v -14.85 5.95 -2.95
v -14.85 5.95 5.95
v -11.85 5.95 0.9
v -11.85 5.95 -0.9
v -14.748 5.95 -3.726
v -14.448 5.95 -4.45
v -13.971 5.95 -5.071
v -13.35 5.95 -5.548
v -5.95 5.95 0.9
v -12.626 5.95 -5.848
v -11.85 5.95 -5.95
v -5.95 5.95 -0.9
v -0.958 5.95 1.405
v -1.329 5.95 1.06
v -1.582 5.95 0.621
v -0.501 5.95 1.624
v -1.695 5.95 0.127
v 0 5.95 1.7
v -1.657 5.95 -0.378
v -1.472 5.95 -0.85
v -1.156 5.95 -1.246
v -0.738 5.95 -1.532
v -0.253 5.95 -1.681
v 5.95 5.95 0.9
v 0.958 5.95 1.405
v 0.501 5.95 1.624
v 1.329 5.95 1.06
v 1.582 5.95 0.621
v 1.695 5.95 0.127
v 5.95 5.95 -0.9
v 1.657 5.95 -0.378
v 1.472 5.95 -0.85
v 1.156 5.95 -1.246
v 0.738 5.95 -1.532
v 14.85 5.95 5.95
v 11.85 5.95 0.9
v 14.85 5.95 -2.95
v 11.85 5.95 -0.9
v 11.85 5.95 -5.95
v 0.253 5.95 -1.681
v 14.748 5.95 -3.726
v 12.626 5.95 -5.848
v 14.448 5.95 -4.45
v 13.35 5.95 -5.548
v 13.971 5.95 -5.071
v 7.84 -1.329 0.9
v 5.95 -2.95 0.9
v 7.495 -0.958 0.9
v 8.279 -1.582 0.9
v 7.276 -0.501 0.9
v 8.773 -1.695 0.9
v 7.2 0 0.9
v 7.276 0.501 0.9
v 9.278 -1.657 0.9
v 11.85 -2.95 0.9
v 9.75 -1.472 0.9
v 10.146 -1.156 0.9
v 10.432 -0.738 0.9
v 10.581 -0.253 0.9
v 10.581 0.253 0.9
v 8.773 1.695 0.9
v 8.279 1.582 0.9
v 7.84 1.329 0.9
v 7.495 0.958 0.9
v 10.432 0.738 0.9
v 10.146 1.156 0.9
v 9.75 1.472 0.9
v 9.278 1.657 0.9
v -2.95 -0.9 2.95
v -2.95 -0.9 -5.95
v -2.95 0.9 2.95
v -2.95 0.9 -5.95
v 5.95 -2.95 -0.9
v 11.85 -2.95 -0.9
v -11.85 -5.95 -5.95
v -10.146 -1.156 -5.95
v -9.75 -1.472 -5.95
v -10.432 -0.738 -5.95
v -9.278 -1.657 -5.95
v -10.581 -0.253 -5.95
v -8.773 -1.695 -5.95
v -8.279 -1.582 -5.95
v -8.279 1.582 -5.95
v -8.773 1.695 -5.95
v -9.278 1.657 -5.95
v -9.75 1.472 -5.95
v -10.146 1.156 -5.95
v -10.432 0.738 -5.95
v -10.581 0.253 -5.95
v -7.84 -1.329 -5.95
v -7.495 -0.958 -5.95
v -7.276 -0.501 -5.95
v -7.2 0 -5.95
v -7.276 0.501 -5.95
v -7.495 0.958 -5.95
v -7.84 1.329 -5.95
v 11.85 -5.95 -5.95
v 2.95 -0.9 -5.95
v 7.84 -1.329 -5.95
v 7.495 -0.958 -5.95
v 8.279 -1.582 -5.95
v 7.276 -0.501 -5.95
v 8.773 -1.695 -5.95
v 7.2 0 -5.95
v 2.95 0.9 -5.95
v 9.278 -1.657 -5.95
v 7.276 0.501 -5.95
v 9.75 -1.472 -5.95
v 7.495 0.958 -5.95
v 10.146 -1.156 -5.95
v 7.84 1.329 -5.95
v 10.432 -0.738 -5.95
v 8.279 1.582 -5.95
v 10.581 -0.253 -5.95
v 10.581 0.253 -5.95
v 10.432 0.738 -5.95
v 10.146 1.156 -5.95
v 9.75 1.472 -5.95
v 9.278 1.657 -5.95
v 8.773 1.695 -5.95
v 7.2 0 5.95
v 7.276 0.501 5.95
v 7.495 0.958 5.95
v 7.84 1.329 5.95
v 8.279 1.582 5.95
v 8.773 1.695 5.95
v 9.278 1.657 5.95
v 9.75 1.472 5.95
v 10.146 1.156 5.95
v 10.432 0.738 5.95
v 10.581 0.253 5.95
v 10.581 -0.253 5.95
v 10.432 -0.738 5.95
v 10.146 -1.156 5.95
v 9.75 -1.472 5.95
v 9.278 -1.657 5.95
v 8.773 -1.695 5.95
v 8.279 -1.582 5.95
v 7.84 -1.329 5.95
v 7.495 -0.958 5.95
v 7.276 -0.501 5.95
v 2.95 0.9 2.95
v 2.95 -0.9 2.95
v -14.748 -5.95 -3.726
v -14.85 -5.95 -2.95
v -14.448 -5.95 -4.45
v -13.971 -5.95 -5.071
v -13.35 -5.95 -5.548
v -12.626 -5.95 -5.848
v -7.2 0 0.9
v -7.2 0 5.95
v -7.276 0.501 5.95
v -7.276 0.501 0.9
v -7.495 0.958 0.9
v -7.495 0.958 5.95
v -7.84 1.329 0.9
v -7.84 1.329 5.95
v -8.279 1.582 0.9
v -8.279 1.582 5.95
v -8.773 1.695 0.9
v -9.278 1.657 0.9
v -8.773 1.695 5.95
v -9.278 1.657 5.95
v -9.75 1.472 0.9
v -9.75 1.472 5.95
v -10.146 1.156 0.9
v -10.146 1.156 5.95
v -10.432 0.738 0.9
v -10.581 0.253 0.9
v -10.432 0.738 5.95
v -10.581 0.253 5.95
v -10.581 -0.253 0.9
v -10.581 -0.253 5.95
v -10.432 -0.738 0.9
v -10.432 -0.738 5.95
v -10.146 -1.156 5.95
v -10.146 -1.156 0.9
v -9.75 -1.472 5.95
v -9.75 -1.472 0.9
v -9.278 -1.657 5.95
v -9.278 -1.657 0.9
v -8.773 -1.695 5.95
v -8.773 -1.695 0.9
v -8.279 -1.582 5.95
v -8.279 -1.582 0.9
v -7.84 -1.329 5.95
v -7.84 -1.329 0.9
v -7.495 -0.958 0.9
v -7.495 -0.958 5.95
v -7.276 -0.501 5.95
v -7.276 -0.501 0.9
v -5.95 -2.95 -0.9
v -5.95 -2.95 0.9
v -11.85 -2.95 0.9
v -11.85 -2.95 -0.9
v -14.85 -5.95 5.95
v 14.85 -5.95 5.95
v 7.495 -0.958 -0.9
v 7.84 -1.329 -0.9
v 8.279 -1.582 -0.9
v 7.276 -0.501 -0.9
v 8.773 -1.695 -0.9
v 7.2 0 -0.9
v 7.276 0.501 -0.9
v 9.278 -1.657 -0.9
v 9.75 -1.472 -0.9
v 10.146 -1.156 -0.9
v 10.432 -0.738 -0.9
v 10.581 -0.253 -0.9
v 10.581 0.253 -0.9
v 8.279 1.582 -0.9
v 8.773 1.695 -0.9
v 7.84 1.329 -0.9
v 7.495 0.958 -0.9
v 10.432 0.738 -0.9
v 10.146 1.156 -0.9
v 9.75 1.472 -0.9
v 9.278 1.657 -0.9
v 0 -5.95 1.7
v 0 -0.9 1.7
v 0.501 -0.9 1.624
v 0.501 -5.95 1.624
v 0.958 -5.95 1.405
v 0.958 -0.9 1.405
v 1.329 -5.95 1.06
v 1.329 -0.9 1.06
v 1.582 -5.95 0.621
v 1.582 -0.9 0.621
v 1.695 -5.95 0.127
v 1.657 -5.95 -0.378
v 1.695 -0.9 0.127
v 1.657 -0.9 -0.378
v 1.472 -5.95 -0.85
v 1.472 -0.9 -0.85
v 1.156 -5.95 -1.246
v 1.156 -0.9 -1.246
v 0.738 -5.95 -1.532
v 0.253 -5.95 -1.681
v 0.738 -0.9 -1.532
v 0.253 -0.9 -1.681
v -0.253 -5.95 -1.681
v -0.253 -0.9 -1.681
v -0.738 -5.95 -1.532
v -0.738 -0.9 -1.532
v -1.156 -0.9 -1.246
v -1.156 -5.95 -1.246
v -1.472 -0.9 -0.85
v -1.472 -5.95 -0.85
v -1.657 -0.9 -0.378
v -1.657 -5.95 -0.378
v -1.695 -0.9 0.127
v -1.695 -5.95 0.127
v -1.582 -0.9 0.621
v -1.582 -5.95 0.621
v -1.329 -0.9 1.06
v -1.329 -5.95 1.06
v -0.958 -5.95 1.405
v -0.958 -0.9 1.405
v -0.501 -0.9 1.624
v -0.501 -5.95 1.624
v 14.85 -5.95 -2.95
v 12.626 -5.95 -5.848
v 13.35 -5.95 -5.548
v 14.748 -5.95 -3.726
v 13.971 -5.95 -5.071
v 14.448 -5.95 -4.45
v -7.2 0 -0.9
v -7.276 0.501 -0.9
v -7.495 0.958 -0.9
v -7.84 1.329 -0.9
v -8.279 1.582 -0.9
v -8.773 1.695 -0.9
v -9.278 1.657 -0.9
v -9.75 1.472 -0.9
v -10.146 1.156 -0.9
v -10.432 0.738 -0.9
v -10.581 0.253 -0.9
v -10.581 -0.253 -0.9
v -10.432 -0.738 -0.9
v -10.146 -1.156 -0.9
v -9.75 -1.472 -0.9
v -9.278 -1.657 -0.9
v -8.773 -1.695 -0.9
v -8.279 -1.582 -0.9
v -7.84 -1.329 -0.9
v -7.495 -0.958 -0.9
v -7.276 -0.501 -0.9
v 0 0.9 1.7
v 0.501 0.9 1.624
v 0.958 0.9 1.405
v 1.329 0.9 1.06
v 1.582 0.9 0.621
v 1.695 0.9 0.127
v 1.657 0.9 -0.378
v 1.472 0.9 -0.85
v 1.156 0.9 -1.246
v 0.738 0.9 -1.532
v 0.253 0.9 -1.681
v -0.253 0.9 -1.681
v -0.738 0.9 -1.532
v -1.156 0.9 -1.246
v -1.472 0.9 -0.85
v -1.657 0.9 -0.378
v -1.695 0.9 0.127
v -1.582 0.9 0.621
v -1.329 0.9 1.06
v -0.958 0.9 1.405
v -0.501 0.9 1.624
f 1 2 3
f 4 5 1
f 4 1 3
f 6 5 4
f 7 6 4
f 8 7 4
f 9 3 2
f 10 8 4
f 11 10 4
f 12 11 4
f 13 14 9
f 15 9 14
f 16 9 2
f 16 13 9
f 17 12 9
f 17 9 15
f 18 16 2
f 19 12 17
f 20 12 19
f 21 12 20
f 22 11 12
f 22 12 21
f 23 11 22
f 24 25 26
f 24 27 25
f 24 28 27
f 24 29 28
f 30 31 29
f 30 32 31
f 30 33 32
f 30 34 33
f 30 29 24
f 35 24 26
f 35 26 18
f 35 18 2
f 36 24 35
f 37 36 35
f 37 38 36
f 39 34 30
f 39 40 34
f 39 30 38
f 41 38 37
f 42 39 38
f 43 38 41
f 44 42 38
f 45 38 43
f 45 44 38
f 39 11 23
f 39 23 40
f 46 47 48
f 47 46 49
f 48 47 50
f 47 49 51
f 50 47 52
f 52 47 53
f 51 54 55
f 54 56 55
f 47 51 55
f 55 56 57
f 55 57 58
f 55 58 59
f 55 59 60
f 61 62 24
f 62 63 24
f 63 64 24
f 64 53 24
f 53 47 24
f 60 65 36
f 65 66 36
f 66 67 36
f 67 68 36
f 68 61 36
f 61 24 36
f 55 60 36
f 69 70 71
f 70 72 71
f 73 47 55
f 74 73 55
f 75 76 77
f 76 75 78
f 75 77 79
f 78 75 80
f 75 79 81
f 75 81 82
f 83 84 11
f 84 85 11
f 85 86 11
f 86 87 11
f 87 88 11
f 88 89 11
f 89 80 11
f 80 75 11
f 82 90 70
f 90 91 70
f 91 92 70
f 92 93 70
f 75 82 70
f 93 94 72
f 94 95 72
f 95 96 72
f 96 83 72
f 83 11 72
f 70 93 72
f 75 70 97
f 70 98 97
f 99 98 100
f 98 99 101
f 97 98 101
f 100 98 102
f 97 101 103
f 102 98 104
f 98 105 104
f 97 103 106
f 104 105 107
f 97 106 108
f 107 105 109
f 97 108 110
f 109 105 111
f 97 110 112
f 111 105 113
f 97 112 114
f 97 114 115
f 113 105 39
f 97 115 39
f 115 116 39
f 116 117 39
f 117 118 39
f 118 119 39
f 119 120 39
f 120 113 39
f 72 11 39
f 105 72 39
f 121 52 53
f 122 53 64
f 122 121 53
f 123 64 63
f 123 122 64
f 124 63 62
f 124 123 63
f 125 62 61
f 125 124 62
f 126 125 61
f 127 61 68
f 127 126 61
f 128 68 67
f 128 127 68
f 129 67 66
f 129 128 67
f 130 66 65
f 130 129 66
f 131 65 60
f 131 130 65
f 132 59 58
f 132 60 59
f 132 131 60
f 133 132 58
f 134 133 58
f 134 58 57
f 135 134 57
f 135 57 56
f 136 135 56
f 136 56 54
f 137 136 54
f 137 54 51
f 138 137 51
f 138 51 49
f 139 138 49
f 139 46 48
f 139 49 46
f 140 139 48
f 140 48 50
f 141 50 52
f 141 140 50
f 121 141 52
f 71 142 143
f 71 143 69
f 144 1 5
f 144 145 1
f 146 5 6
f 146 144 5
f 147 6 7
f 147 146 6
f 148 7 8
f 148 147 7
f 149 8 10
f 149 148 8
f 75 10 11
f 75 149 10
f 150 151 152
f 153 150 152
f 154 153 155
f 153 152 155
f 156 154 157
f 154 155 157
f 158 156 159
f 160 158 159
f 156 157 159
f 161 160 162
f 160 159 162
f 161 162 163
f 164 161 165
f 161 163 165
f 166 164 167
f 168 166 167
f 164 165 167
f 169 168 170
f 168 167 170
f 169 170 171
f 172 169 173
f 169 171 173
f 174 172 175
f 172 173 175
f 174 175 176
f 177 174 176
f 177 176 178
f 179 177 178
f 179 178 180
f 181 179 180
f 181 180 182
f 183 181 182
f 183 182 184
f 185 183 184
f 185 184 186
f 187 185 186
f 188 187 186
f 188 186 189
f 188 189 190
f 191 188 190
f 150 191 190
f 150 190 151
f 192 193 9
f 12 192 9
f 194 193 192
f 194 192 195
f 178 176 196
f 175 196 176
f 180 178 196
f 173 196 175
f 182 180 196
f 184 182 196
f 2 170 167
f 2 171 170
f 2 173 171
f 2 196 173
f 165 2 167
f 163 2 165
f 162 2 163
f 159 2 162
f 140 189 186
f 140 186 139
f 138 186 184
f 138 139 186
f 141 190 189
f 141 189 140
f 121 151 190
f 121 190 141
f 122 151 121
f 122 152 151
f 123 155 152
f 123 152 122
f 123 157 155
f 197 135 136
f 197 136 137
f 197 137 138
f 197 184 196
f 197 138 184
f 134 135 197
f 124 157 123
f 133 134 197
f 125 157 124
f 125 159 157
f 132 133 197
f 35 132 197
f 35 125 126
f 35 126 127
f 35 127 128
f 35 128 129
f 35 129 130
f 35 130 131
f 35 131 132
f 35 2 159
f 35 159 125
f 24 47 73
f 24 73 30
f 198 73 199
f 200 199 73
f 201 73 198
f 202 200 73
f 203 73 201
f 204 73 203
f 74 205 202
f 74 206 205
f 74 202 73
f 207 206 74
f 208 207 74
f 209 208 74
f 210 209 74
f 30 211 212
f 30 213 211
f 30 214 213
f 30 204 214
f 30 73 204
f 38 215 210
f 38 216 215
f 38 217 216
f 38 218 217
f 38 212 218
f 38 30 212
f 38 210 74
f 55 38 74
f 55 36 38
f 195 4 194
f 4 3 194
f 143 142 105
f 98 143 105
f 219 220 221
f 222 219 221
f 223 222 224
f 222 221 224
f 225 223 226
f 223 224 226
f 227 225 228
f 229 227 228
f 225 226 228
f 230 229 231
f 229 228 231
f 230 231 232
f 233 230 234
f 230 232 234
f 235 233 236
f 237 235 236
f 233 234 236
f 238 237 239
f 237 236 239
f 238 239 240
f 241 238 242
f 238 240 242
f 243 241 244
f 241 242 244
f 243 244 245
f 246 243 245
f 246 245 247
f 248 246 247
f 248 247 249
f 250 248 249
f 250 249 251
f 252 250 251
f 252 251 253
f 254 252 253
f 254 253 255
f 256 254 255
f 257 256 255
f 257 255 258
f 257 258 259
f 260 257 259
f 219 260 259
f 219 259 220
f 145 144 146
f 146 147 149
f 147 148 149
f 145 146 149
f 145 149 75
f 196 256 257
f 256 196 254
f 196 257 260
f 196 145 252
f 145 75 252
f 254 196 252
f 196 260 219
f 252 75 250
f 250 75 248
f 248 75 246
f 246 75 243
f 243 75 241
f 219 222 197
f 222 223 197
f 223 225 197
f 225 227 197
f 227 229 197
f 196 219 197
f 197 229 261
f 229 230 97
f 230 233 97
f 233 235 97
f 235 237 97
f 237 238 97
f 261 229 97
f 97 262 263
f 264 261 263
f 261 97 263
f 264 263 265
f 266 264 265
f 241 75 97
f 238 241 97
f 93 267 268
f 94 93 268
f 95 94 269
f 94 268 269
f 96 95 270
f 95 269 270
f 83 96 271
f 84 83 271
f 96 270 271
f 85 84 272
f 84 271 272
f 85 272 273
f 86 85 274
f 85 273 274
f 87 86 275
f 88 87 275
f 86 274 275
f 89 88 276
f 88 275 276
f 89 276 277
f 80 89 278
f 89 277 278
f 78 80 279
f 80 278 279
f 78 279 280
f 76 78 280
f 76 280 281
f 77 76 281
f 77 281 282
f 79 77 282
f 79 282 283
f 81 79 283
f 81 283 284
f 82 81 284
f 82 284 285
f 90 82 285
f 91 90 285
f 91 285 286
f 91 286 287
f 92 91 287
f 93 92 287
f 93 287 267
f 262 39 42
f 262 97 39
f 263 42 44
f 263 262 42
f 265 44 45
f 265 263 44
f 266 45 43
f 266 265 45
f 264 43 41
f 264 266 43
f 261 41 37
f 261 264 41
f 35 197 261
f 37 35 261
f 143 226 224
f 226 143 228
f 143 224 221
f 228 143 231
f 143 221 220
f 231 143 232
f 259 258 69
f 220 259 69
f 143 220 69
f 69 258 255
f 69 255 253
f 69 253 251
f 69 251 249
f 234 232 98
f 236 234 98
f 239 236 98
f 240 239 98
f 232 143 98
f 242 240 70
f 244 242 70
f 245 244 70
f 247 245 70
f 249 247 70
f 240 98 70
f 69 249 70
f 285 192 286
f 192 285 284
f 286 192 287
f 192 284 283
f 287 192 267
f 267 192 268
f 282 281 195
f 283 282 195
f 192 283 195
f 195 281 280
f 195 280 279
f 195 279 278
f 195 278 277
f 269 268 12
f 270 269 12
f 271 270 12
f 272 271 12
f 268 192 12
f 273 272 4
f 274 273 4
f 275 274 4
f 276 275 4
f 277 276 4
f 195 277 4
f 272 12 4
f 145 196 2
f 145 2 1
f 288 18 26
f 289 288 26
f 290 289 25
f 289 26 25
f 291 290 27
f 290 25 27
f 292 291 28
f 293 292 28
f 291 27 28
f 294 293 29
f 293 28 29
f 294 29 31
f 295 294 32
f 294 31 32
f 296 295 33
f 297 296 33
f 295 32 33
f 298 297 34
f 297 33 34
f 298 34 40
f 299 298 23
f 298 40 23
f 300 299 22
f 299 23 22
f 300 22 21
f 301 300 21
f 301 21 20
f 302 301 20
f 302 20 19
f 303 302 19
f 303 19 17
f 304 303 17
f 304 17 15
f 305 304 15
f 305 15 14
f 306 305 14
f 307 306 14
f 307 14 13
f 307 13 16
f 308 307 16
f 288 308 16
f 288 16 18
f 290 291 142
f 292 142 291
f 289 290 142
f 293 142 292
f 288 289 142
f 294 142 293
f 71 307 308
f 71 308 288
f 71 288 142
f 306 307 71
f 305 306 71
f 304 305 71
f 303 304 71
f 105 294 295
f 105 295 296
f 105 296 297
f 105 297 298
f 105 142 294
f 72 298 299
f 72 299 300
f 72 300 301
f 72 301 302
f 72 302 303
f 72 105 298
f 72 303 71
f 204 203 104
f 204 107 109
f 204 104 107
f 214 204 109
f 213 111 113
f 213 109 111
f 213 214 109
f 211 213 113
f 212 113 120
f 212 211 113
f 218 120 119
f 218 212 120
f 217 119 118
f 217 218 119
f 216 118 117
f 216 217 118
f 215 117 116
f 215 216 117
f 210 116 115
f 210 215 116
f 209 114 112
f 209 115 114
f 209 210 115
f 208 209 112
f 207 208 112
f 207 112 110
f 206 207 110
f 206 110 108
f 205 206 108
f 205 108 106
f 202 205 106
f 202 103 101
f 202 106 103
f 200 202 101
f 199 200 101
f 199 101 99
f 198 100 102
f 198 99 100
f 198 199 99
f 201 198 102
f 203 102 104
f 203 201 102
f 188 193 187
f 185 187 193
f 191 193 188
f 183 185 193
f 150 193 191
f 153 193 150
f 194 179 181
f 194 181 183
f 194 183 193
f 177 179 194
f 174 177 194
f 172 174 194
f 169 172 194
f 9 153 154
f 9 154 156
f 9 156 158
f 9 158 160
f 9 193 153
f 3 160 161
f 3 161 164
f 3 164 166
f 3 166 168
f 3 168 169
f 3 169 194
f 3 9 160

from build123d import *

# Parameters (mm, degrees)
SKETCH1_W           = 29.7
SKETCH1_H           = 11.9
BOSS_EXTRUDE1_DEPTH = 5.95
SKETCH2_R           = 1.7
CUT_EXTRUDE1_DEPTH  = 20.938279765
CUT_EXTRUDE2_DEPTH  = 0.9
SKETCH4_R           = 1.7
CUT_EXTRUDE3_DEPTH  = 20.938279765
CUT_EXTRUDE4_DEPTH  = 0.9
FILLET1_R           = 3


with BuildPart() as part:
    # Sketch1 → Boss-Extrude1 (new, symmetric)
    with BuildSketch(Plane(origin=(0, 0, 0), x_dir=(1, 0, 0), z_dir=(0, 1, 0))):
        Rectangle(SKETCH1_W, SKETCH1_H)
    extrude(amount=BOSS_EXTRUDE1_DEPTH, both=True)

    # Sketch2 → Cut-Extrude1 (cut, through all)
    with BuildSketch(Plane.XY.offset(5.95)):
        with Locations((-8.9, 0)):
            Circle(SKETCH2_R)
    cut_extrude1 = extrude(amount=-CUT_EXTRUDE1_DEPTH, mode=Mode.SUBTRACT)

    # Sketch3 → Cut-Extrude2 (cut, symmetric)
    with BuildSketch(Plane.XY):
        Polygon((-11.85, 2.95), (-11.85, 5.95), (-5.95, 5.95), (-5.95, 2.95), (-5.95, -2.95), (-11.85, -2.95), align=None)
    cut_extrude2 = extrude(amount=CUT_EXTRUDE2_DEPTH, both=True, mode=Mode.SUBTRACT)

    # Mirror1: Cut-Extrude1, Cut-Extrude2 across plane
    add(cut_extrude1.mirror(Plane(origin=(0, 0, 0), x_dir=(0, 0, 1), z_dir=(1, 0, 0))), mode=Mode.SUBTRACT)
    add(cut_extrude2.mirror(Plane(origin=(0, 0, 0), x_dir=(0, 0, 1), z_dir=(1, 0, 0))), mode=Mode.SUBTRACT)

    # Sketch4 → Cut-Extrude3 (cut, through all)
    with BuildSketch(Plane(origin=(0, 5.95, 0), x_dir=(1, 0, 0), z_dir=(0, 1, 0))):
        with Locations(Location((0, 0, 0), (0, 0, 270))):
            Circle(SKETCH4_R)
    extrude(amount=-CUT_EXTRUDE3_DEPTH, mode=Mode.SUBTRACT)

    # Sketch5 → Cut-Extrude4 (cut, symmetric)
    with BuildSketch(Plane(origin=(0, 0, 0), x_dir=(1, 0, 0), z_dir=(0, 1, 0))):
        Polygon((-2.95, 2.95), (-2.95, 5.95), (2.95, 5.95), (2.95, 2.95), (2.95, -2.95), (-2.95, -2.95), align=None)
    extrude(amount=CUT_EXTRUDE4_DEPTH, both=True, mode=Mode.SUBTRACT)

    # Fillet1
    fillet1_edges = [part.edges().sort_by_distance(p)[0] for p in [
        (-14.85, 0, -5.95),
        (14.85, 0, -5.95),
    ]]
    fillet(fillet1_edges, radius=FILLET1_R)


solid = part.part
